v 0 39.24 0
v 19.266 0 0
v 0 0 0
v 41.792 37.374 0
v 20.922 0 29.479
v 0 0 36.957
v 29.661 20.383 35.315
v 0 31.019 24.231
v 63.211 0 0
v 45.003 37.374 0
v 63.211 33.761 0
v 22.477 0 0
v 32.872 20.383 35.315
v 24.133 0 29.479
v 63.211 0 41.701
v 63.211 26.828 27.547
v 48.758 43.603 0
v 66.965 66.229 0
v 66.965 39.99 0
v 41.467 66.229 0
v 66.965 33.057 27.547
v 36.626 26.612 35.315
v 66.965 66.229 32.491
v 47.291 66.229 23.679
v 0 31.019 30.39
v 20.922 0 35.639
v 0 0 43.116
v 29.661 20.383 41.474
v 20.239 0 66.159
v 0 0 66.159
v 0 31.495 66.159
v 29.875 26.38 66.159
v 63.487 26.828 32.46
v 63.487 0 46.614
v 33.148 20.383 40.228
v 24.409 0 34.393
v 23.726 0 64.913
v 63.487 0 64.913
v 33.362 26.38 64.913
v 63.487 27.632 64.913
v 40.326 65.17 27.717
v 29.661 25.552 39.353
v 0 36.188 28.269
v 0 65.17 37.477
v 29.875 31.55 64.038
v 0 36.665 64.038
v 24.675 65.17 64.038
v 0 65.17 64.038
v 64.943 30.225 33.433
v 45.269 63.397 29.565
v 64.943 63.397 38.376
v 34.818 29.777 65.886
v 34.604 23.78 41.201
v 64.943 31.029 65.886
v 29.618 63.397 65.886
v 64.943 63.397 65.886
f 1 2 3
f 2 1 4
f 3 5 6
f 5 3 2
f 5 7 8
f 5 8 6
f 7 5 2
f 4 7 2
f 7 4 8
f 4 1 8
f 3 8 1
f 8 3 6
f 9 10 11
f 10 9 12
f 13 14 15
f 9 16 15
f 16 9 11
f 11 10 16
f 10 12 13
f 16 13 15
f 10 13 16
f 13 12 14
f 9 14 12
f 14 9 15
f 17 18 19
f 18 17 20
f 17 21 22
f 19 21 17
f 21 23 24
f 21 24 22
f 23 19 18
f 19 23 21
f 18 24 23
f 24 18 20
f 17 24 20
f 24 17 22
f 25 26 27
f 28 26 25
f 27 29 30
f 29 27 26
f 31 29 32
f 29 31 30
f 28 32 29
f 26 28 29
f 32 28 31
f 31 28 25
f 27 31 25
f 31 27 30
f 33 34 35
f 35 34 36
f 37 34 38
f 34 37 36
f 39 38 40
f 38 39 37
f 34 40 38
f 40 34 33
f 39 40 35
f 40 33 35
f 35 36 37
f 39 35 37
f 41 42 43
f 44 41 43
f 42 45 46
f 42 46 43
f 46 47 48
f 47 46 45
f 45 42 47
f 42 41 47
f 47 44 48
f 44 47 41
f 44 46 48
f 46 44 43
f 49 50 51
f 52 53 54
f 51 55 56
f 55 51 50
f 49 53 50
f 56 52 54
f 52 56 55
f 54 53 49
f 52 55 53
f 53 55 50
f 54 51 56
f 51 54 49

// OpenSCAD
//Variation from perfect cube shape. From 0 to .5
MaxIntensity = .4;
MinIntensity = .2;


//number of sub-cubes in each direction
Xcubes = 2;
Ycubes = 2;
Zcubes = 2;


xsides = Xcubes+1;
ysides = Ycubes+1;
zsides = Zcubes+1;



//Average sub-cube width in mm
scale = 30;


//added distance between sub-cubes in cube layout
seperation = 5;

/* [Holder] */

generateHolder = 0;//	[0:Don't make holder, 1:make holder]
borderTolerance = 2;
baseThickness = 4;
wallWidth = 3;
wallHeight = 10;

if(generateHolder == 1){
    translate([0,-(Ycubes*scale+borderTolerance*2+wallWidth*2)-5,0]){
        difference(){
            //large scale for base
            
        cube([Xcubes*scale+2*(wallWidth+borderTolerance),
              Ycubes*scale+2*(wallWidth+borderTolerance),
              baseThickness+wallHeight]);
            translate([wallWidth,wallWidth,baseThickness])
        cube([  Xcubes*scale+2*borderTolerance,
                Ycubes*scale+2*borderTolerance,
                wallHeight+1]);
        }
        
    }
}


list2 = [ for (a = [0:zsides-1], b = [0:ysides-1], c = [0:xsides-1])
          
          randomizeSides([c,b,a])
];
blankList = [ for (a = [0:zsides-1], b = [0:ysides-1], c = [0:xsides-1])
          
          [c,b,a]
];

function randomSign() = sign(rands(-1,1,1)[0]);
function randomDrift() = randomSign()*(rands(MinIntensity,MaxIntensity,1)[0]);

echo("random test",randomDrift());

function Xside(point) = ( point[1]==0 || point[1]==ysides-1);
function Yside(point) = ( point[0]==0 || point[0]==xsides-1);
function Zside(point) = ( point[2]==0 || point[2]==zsides-1);
function Xedge(point) = ( Xside(point) && Zside(point));
function Yedge(point) = ( Yside(point) && Zside(point));
function Zedge(point) = ( Xside(point) && Yside(point));          
function corner(point) = (Xside(point)&&Yside(point)&&Zside(point));
function edge(point) =  (( (Xside(point) && Yside(point)) ||
                          (Xside(point) && Zside(point)) ||
                          (Yside(point) && Zside(point)) ));


//if on x side, randomize x,z
//if on y side, randomize y,z
//if on z side, randomize x,y
//if on inside, randomize x,y,z
    //This means:
// randomize x, if on x side, z side, or inside
// randomize y, if on y side, z side, or inside
// randomize z, if on x side, y side, or inside
function randomizeSides(point) = [
          //randomize x component;
          int(!Yside(point))*rands(-MaxIntensity,MaxIntensity,1)[0]+point[0],
          //randomize the y part;
          int(!Xside(point))*rands(-MaxIntensity,MaxIntensity,1)[0]+point[1],
          //randomize the z part;
          int(!Zside(point))*rands(-MaxIntensity,MaxIntensity,1)[0]+point[2]];
          
//function randomizeSides(point) = (i=);
function int(booleanInput) = [for(i=[0:1]) if((booleanInput==false && i==0)||(booleanInput==true && i==1))i][0];
ifValue=int(true);
echo("random",rands(-MaxIntensity,MaxIntensity,1)[0]);

  
   
/*function XZside(point) = (( point[0]==0 || point[0]==sideLength-1) && 
                          ( point[1]==0 || point[1]==sideLength-1));
function YZside(point) = (( point[1]==0 || point[1]==sideLength-1) && 
                          ( point[2]==0 || point[2]==sideLength-1));
          */
function inside(point) = (  point[0]!=0 && point[0]!=xsides-1 &&
                            point[1]!=0 && point[1]!=ysides-1 &&
                            point[2]!=0 && point[2]!=zsides-1 );


//for testing layouts

/*for(j=[0:xsides*ysides+xsides]){
    translate(list2[j]*scale)
    cube([5,5,5]);
}*/


  
  


//Find the points that a cube can be started from
startSpots=[for(i=[0:len(blankList)-1])
    if((blankList[i][0]!=xsides-1)&&
       (blankList[i][1]!=ysides-1)&&
       (blankList[i][2]!=zsides-1))
    
    i];
    echo("startSpots",startSpots);
    //0,1,3,4,9,10,12,13,27
  






//for each point that a cube can start from
for(i=[0:len(startSpots)-1]){

    
    //the point that the given cube starts on
    a=startSpots[i];
    
    echo("a = ",a);
    //the points used to make that cube
    g = [   a,
            a+1,
            a+xsides+1,
            a+xsides,
            a+xsides*ysides,
            a+xsides*ysides+1,
            a+xsides*ysides+xsides+1,
            a+xsides*ysides+xsides];
    
    /*for(j=[0:len(g)-1]){
    translate(list2[g[j]]*scale)
    cube([5,5,5]);
}*/
  
    //the faces based on those points;
    CubeFaces = [
        [g[0],g[1],g[2],g[3]],  // bottom
        [g[4],g[5],g[1],g[0]],  // front
        [g[7],g[6],g[5],g[4]],  // top
        [g[5],g[6],g[2],g[1]],  // right
        [g[6],g[7],g[3],g[2]],  // back
        [g[7],g[4],g[0],g[3]]]; // left
    
    
        translate(list2[a]*seperation)
        polyhedron( list2*scale, CubeFaces );
    
    
    
}
